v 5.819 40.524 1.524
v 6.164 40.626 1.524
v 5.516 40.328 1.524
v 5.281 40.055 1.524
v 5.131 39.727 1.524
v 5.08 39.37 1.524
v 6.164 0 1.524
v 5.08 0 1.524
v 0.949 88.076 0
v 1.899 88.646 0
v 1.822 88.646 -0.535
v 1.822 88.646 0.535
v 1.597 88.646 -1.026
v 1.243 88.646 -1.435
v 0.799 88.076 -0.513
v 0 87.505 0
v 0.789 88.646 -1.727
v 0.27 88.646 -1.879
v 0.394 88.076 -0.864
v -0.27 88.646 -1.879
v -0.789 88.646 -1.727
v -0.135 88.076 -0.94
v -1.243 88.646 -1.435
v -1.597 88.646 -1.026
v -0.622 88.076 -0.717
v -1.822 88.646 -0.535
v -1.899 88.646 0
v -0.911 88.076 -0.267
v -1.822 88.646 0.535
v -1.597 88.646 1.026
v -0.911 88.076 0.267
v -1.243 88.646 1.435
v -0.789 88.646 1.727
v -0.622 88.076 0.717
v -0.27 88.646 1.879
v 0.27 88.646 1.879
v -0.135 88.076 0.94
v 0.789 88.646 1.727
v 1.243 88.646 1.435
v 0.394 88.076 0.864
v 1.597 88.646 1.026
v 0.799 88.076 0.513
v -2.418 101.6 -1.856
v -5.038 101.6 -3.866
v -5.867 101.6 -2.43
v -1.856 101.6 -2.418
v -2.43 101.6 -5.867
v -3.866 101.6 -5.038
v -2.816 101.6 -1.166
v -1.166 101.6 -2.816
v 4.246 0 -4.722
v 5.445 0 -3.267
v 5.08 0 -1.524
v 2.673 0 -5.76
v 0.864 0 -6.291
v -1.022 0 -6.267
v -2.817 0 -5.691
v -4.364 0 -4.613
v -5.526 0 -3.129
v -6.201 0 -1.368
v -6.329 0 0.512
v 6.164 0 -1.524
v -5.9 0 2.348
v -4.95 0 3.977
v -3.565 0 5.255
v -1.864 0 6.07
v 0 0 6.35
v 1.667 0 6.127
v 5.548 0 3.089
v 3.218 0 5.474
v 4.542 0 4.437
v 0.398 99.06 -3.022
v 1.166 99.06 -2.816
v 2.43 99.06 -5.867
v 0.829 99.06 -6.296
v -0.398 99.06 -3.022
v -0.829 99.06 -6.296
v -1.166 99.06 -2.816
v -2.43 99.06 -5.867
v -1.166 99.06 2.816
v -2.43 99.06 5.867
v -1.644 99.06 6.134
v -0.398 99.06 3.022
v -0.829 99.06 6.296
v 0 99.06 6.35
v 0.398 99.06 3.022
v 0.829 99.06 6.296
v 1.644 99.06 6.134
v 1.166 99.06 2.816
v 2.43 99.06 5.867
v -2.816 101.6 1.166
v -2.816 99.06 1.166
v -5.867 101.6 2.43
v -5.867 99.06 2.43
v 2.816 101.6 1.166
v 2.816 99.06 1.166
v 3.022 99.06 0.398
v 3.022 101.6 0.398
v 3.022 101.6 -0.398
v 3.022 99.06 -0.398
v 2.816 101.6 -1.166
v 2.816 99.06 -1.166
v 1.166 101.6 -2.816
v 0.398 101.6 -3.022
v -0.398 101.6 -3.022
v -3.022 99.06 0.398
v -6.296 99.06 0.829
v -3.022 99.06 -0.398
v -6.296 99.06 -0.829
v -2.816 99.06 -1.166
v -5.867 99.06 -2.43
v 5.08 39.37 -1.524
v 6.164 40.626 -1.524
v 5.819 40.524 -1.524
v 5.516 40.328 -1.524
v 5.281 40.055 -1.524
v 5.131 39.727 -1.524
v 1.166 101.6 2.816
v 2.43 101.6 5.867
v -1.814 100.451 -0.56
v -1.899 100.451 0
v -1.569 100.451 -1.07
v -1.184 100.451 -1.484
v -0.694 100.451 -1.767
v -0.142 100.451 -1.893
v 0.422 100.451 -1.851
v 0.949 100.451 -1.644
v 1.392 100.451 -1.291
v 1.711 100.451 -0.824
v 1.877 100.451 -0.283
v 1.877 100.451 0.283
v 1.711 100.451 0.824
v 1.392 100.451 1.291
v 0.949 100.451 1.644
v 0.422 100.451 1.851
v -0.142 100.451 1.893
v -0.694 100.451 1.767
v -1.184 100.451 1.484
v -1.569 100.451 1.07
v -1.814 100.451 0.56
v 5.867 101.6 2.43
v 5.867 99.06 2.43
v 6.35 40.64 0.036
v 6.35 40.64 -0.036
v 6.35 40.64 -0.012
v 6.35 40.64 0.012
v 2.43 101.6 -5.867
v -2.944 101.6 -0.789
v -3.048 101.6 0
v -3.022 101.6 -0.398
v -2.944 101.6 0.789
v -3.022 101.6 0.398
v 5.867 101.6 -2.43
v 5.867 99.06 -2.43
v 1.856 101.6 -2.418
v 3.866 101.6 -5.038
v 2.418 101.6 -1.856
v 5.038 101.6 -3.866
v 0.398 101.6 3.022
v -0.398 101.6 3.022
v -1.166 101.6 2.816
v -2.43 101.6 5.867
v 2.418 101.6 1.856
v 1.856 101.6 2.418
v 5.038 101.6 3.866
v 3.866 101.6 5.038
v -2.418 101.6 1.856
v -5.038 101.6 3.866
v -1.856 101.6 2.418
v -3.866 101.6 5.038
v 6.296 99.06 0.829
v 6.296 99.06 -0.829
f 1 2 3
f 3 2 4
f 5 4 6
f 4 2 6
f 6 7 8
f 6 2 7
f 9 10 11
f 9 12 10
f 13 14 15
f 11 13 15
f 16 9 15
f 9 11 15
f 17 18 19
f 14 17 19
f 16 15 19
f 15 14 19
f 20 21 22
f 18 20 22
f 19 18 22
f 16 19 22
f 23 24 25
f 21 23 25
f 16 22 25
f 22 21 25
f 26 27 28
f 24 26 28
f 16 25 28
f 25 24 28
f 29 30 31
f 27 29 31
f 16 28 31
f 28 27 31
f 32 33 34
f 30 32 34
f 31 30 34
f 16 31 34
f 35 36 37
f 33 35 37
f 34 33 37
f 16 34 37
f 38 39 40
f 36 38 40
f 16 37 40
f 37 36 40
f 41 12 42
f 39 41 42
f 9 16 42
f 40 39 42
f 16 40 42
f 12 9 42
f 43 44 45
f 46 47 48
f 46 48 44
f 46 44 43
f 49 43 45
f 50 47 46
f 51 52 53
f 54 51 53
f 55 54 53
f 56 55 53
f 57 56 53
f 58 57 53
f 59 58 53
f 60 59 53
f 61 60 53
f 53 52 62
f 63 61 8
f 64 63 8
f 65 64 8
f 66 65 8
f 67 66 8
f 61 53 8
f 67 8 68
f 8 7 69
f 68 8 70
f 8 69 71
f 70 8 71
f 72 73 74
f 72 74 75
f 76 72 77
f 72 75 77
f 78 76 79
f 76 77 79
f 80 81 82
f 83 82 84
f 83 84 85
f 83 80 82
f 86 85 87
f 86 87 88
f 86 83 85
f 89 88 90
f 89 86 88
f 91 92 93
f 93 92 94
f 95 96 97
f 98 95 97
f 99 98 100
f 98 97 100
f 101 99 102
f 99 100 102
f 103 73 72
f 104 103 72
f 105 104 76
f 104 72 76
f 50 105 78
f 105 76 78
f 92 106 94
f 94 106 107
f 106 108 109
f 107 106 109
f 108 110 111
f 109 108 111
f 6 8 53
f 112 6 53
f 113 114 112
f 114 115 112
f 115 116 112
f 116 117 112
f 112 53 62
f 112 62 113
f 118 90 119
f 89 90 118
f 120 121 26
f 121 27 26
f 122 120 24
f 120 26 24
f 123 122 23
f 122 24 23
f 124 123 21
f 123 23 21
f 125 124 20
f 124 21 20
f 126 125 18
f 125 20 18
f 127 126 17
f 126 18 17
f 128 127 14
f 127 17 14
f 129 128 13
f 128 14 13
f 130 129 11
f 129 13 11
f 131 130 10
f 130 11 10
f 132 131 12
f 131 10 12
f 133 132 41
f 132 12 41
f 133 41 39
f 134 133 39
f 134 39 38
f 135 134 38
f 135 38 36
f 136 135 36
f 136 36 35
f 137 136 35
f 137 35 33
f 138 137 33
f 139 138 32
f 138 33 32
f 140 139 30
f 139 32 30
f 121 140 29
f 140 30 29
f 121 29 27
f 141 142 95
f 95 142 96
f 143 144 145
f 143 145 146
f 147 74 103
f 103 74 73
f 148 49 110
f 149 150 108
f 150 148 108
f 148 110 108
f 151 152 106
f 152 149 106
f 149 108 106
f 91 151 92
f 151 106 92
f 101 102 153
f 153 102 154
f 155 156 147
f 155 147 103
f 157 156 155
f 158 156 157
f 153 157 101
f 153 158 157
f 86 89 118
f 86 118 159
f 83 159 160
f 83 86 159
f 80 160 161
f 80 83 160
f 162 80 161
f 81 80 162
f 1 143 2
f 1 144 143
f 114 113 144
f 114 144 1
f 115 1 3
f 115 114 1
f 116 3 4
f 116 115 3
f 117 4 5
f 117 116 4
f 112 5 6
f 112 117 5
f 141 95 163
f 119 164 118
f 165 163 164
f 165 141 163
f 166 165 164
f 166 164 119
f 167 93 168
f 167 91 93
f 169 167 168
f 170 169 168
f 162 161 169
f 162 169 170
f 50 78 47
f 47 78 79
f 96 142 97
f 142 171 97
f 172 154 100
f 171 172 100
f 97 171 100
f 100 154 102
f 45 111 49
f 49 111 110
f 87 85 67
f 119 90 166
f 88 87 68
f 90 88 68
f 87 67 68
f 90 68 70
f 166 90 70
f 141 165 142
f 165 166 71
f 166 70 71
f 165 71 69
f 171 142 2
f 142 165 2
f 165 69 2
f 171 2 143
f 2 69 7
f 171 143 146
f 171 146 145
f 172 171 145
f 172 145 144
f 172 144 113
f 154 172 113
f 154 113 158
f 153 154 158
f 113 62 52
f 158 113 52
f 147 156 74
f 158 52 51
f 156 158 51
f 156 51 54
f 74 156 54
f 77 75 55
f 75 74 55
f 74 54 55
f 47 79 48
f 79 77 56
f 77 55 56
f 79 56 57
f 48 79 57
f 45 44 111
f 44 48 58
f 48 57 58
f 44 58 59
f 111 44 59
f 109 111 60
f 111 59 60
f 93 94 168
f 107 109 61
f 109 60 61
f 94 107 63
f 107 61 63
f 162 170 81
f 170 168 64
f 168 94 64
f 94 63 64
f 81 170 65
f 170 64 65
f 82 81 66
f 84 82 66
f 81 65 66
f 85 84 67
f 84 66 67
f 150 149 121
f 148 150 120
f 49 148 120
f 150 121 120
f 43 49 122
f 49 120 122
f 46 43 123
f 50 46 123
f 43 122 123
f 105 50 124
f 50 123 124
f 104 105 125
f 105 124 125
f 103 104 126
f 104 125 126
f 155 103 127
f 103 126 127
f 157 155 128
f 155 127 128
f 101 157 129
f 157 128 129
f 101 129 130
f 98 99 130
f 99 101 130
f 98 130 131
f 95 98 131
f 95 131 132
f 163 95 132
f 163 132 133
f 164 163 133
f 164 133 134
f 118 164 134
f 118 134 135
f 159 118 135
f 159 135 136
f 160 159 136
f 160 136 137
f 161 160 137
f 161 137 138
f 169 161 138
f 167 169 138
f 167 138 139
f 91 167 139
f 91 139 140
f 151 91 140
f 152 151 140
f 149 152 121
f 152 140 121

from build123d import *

# Parameters (mm, degrees)
SKETCH1_R                        = 6.35
BOSS_EXTRUDE1_DEPTH              = 101.6
CUT_EXTRUDE1_DEPTH               = 40.64
FILLET1_R                        = 1.27
F_10_24_TAPPED_HOLE1_D           = 3.7973
F_10_24_TAPPED_HOLE1_DEPTH       = 12.954
F_10_24_TAPPED_HOLE1_CSINK_D     = 6.096
F_10_24_TAPPED_HOLE1_CSINK_ANGLE = 90
F_10_24_TAPPED_HOLE1_TIP         = 1.140824014
CUT_EXTRUDE3_START               = -2.54
CUT_EXTRUDE3_DEPTH               = 2.54


with BuildPart() as part:
    # Sketch1 → Boss-Extrude1 (new body)
    with BuildSketch(Plane(origin=(0, 0, 0), x_dir=(1, 0, 0), z_dir=(0, 1, 0))):
        with Locations(Location((0, 0, 0), (0, 0, 270))):
            Circle(SKETCH1_R)
    extrude(amount=BOSS_EXTRUDE1_DEPTH)

    # Sketch2 → Cut-Extrude1 (cut)
    with BuildSketch(Plane(origin=(0, 0, 0), x_dir=(-1, 0, 0), z_dir=(0, -1, 0))):
        with BuildLine():
            Line((-6.164407839, -1.524), (-5.08, -1.524))
            Line((-5.08, -1.524), (-5.08, 1.524))
            Line((-5.08, 1.524), (-6.164407839, 1.524))
            ThreePointArc((-6.164407839, 1.524), (-6.35, 0), (-6.164407839, -1.524))
        make_face()
    extrude(amount=-CUT_EXTRUDE1_DEPTH, mode=Mode.SUBTRACT)

    # Fillet1
    fillet1_edges = [part.edges().sort_by_distance(p)[0] for p in [
        (5.08, 40.64, 0),
    ]]
    fillet(fillet1_edges, radius=FILLET1_R - 0.0001)  # a hair under: the kernel refuses the full size

    # #10-24 Tapped Hole1
    with Locations(Plane(origin=(0, 101.6, 0), x_dir=(1, 0, 0), z_dir=(0, 1, 0))):
        with Locations((0, 0)):
            CounterSinkHole(F_10_24_TAPPED_HOLE1_D / 2, F_10_24_TAPPED_HOLE1_CSINK_D / 2, depth=F_10_24_TAPPED_HOLE1_DEPTH, counter_sink_angle=F_10_24_TAPPED_HOLE1_CSINK_ANGLE)
            with Locations((0, 0, -(F_10_24_TAPPED_HOLE1_DEPTH + F_10_24_TAPPED_HOLE1_TIP / 2))):  # 118° drill point
                Cone(0, F_10_24_TAPPED_HOLE1_D / 2, F_10_24_TAPPED_HOLE1_TIP, mode=Mode.SUBTRACT)

    # Sketch6 → Cut-Extrude3 (cut)
    with BuildSketch(Plane(origin=(0, 101.6, 0), x_dir=(1, 0, 0), z_dir=(0, 1, 0)).offset(CUT_EXTRUDE3_START)):
        with BuildLine():
            Line((2.430039796, -5.866635031), (1.166419102, -2.815984815))
            ThreePointArc((1.166419102, -2.815984815), (0, -3.048), (-1.166419102, -2.815984815))
            Line((-1.166419102, -2.815984815), (-2.430039796, -5.866635031))
            ThreePointArc((-2.430039796, -5.866635031), (0, -6.35), (2.430039796, -5.866635031))
        make_face()
        with BuildLine():
            Line((-5.866635031, 2.430039796), (-2.815984815, 1.166419102))
            ThreePointArc((-2.815984815, 1.166419102), (-3.048, 0), (-2.815984815, -1.166419102))
            Line((-2.815984815, -1.166419102), (-5.866635031, -2.430039796))
            ThreePointArc((-5.866635031, -2.430039796), (-6.35, 0), (-5.866635031, 2.430039796))
        make_face()
        with BuildLine():
            Line((2.430039796, 5.866635031), (1.166419102, 2.815984815))
            ThreePointArc((1.166419102, 2.815984815), (0, 3.048), (-1.166419102, 2.815984815))
            Line((-1.166419102, 2.815984815), (-2.430039796, 5.866635031))
            ThreePointArc((-2.430039796, 5.866635031), (0, 6.35), (2.430039796, 5.866635031))
        make_face()
        with BuildLine():
            Line((5.866635031, -2.430039796), (2.815984815, -1.166419102))
            ThreePointArc((2.815984815, -1.166419102), (3.048, 0), (2.815984815, 1.166419102))
            Line((2.815984815, 1.166419102), (5.866635031, 2.430039796))
            ThreePointArc((5.866635031, 2.430039796), (6.35, 0), (5.866635031, -2.430039796))
        make_face()
    extrude(amount=CUT_EXTRUDE3_DEPTH, mode=Mode.SUBTRACT)


solid = part.part
